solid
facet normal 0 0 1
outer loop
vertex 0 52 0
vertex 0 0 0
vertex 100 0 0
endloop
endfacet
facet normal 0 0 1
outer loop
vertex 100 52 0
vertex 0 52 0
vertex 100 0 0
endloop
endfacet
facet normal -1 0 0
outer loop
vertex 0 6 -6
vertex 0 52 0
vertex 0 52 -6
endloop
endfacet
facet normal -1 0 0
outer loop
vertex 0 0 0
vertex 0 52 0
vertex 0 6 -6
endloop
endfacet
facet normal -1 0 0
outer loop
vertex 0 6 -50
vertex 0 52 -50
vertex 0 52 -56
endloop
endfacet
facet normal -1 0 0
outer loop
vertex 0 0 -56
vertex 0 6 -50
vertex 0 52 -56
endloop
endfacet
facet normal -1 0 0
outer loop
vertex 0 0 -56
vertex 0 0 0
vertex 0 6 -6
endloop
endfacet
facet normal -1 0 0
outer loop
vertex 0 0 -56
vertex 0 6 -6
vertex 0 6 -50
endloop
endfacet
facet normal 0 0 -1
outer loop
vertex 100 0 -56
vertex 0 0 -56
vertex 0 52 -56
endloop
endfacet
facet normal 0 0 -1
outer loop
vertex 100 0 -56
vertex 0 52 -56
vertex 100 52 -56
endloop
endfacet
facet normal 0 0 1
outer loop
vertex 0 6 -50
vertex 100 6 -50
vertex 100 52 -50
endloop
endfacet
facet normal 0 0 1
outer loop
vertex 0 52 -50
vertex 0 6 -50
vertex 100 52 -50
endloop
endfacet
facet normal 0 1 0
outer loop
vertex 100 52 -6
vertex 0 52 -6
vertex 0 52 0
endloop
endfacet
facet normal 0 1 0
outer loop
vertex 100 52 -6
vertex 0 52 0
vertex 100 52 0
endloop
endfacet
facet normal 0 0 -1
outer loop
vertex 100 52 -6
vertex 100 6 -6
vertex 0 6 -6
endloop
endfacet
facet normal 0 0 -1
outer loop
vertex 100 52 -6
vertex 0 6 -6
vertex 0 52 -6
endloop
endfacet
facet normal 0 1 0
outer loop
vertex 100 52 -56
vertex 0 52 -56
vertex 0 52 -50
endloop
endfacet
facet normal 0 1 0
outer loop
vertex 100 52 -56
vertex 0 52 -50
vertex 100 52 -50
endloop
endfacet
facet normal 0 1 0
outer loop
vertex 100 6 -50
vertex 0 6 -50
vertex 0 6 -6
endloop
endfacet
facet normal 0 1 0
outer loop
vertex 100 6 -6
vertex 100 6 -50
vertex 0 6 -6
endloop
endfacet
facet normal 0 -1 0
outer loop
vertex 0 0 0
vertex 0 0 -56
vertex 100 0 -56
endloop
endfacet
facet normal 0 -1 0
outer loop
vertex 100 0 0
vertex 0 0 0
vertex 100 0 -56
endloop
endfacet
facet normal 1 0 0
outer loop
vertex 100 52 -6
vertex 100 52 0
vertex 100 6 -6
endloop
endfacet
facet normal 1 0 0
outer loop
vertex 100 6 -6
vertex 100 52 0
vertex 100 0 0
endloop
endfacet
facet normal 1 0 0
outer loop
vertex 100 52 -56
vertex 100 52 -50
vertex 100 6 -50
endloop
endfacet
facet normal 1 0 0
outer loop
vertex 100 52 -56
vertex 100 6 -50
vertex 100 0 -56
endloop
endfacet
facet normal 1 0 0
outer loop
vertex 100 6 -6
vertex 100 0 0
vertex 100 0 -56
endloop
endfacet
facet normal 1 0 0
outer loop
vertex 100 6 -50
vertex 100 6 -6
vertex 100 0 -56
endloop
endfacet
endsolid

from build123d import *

# Parameters (mm, degrees)
SKETCH1_W           = 100
SKETCH1_H           = 56
BOSS_EXTRUDE1_DEPTH = 52
SKETCH4_W           = 44
SKETCH4_H           = 50
CUT_EXTRUDE2_DEPTH  = 126.85706178


with BuildPart() as part:
    # Sketch1 → Boss-Extrude1 (new body)
    with BuildSketch(Plane(origin=(0, 0, 0), x_dir=(1, 0, 0), z_dir=(0, 1, 0))):
        with Locations((50, 28)):
            Rectangle(SKETCH1_W, SKETCH1_H)
    extrude(amount=BOSS_EXTRUDE1_DEPTH)

    # Sketch4 → Cut-Extrude2 (cut, through all)
    with BuildSketch(Plane.ZY):
        with Locations((-28, 31)):
            Rectangle(SKETCH4_W, SKETCH4_H)
    extrude(amount=-CUT_EXTRUDE2_DEPTH, mode=Mode.SUBTRACT)


solid = part.part
